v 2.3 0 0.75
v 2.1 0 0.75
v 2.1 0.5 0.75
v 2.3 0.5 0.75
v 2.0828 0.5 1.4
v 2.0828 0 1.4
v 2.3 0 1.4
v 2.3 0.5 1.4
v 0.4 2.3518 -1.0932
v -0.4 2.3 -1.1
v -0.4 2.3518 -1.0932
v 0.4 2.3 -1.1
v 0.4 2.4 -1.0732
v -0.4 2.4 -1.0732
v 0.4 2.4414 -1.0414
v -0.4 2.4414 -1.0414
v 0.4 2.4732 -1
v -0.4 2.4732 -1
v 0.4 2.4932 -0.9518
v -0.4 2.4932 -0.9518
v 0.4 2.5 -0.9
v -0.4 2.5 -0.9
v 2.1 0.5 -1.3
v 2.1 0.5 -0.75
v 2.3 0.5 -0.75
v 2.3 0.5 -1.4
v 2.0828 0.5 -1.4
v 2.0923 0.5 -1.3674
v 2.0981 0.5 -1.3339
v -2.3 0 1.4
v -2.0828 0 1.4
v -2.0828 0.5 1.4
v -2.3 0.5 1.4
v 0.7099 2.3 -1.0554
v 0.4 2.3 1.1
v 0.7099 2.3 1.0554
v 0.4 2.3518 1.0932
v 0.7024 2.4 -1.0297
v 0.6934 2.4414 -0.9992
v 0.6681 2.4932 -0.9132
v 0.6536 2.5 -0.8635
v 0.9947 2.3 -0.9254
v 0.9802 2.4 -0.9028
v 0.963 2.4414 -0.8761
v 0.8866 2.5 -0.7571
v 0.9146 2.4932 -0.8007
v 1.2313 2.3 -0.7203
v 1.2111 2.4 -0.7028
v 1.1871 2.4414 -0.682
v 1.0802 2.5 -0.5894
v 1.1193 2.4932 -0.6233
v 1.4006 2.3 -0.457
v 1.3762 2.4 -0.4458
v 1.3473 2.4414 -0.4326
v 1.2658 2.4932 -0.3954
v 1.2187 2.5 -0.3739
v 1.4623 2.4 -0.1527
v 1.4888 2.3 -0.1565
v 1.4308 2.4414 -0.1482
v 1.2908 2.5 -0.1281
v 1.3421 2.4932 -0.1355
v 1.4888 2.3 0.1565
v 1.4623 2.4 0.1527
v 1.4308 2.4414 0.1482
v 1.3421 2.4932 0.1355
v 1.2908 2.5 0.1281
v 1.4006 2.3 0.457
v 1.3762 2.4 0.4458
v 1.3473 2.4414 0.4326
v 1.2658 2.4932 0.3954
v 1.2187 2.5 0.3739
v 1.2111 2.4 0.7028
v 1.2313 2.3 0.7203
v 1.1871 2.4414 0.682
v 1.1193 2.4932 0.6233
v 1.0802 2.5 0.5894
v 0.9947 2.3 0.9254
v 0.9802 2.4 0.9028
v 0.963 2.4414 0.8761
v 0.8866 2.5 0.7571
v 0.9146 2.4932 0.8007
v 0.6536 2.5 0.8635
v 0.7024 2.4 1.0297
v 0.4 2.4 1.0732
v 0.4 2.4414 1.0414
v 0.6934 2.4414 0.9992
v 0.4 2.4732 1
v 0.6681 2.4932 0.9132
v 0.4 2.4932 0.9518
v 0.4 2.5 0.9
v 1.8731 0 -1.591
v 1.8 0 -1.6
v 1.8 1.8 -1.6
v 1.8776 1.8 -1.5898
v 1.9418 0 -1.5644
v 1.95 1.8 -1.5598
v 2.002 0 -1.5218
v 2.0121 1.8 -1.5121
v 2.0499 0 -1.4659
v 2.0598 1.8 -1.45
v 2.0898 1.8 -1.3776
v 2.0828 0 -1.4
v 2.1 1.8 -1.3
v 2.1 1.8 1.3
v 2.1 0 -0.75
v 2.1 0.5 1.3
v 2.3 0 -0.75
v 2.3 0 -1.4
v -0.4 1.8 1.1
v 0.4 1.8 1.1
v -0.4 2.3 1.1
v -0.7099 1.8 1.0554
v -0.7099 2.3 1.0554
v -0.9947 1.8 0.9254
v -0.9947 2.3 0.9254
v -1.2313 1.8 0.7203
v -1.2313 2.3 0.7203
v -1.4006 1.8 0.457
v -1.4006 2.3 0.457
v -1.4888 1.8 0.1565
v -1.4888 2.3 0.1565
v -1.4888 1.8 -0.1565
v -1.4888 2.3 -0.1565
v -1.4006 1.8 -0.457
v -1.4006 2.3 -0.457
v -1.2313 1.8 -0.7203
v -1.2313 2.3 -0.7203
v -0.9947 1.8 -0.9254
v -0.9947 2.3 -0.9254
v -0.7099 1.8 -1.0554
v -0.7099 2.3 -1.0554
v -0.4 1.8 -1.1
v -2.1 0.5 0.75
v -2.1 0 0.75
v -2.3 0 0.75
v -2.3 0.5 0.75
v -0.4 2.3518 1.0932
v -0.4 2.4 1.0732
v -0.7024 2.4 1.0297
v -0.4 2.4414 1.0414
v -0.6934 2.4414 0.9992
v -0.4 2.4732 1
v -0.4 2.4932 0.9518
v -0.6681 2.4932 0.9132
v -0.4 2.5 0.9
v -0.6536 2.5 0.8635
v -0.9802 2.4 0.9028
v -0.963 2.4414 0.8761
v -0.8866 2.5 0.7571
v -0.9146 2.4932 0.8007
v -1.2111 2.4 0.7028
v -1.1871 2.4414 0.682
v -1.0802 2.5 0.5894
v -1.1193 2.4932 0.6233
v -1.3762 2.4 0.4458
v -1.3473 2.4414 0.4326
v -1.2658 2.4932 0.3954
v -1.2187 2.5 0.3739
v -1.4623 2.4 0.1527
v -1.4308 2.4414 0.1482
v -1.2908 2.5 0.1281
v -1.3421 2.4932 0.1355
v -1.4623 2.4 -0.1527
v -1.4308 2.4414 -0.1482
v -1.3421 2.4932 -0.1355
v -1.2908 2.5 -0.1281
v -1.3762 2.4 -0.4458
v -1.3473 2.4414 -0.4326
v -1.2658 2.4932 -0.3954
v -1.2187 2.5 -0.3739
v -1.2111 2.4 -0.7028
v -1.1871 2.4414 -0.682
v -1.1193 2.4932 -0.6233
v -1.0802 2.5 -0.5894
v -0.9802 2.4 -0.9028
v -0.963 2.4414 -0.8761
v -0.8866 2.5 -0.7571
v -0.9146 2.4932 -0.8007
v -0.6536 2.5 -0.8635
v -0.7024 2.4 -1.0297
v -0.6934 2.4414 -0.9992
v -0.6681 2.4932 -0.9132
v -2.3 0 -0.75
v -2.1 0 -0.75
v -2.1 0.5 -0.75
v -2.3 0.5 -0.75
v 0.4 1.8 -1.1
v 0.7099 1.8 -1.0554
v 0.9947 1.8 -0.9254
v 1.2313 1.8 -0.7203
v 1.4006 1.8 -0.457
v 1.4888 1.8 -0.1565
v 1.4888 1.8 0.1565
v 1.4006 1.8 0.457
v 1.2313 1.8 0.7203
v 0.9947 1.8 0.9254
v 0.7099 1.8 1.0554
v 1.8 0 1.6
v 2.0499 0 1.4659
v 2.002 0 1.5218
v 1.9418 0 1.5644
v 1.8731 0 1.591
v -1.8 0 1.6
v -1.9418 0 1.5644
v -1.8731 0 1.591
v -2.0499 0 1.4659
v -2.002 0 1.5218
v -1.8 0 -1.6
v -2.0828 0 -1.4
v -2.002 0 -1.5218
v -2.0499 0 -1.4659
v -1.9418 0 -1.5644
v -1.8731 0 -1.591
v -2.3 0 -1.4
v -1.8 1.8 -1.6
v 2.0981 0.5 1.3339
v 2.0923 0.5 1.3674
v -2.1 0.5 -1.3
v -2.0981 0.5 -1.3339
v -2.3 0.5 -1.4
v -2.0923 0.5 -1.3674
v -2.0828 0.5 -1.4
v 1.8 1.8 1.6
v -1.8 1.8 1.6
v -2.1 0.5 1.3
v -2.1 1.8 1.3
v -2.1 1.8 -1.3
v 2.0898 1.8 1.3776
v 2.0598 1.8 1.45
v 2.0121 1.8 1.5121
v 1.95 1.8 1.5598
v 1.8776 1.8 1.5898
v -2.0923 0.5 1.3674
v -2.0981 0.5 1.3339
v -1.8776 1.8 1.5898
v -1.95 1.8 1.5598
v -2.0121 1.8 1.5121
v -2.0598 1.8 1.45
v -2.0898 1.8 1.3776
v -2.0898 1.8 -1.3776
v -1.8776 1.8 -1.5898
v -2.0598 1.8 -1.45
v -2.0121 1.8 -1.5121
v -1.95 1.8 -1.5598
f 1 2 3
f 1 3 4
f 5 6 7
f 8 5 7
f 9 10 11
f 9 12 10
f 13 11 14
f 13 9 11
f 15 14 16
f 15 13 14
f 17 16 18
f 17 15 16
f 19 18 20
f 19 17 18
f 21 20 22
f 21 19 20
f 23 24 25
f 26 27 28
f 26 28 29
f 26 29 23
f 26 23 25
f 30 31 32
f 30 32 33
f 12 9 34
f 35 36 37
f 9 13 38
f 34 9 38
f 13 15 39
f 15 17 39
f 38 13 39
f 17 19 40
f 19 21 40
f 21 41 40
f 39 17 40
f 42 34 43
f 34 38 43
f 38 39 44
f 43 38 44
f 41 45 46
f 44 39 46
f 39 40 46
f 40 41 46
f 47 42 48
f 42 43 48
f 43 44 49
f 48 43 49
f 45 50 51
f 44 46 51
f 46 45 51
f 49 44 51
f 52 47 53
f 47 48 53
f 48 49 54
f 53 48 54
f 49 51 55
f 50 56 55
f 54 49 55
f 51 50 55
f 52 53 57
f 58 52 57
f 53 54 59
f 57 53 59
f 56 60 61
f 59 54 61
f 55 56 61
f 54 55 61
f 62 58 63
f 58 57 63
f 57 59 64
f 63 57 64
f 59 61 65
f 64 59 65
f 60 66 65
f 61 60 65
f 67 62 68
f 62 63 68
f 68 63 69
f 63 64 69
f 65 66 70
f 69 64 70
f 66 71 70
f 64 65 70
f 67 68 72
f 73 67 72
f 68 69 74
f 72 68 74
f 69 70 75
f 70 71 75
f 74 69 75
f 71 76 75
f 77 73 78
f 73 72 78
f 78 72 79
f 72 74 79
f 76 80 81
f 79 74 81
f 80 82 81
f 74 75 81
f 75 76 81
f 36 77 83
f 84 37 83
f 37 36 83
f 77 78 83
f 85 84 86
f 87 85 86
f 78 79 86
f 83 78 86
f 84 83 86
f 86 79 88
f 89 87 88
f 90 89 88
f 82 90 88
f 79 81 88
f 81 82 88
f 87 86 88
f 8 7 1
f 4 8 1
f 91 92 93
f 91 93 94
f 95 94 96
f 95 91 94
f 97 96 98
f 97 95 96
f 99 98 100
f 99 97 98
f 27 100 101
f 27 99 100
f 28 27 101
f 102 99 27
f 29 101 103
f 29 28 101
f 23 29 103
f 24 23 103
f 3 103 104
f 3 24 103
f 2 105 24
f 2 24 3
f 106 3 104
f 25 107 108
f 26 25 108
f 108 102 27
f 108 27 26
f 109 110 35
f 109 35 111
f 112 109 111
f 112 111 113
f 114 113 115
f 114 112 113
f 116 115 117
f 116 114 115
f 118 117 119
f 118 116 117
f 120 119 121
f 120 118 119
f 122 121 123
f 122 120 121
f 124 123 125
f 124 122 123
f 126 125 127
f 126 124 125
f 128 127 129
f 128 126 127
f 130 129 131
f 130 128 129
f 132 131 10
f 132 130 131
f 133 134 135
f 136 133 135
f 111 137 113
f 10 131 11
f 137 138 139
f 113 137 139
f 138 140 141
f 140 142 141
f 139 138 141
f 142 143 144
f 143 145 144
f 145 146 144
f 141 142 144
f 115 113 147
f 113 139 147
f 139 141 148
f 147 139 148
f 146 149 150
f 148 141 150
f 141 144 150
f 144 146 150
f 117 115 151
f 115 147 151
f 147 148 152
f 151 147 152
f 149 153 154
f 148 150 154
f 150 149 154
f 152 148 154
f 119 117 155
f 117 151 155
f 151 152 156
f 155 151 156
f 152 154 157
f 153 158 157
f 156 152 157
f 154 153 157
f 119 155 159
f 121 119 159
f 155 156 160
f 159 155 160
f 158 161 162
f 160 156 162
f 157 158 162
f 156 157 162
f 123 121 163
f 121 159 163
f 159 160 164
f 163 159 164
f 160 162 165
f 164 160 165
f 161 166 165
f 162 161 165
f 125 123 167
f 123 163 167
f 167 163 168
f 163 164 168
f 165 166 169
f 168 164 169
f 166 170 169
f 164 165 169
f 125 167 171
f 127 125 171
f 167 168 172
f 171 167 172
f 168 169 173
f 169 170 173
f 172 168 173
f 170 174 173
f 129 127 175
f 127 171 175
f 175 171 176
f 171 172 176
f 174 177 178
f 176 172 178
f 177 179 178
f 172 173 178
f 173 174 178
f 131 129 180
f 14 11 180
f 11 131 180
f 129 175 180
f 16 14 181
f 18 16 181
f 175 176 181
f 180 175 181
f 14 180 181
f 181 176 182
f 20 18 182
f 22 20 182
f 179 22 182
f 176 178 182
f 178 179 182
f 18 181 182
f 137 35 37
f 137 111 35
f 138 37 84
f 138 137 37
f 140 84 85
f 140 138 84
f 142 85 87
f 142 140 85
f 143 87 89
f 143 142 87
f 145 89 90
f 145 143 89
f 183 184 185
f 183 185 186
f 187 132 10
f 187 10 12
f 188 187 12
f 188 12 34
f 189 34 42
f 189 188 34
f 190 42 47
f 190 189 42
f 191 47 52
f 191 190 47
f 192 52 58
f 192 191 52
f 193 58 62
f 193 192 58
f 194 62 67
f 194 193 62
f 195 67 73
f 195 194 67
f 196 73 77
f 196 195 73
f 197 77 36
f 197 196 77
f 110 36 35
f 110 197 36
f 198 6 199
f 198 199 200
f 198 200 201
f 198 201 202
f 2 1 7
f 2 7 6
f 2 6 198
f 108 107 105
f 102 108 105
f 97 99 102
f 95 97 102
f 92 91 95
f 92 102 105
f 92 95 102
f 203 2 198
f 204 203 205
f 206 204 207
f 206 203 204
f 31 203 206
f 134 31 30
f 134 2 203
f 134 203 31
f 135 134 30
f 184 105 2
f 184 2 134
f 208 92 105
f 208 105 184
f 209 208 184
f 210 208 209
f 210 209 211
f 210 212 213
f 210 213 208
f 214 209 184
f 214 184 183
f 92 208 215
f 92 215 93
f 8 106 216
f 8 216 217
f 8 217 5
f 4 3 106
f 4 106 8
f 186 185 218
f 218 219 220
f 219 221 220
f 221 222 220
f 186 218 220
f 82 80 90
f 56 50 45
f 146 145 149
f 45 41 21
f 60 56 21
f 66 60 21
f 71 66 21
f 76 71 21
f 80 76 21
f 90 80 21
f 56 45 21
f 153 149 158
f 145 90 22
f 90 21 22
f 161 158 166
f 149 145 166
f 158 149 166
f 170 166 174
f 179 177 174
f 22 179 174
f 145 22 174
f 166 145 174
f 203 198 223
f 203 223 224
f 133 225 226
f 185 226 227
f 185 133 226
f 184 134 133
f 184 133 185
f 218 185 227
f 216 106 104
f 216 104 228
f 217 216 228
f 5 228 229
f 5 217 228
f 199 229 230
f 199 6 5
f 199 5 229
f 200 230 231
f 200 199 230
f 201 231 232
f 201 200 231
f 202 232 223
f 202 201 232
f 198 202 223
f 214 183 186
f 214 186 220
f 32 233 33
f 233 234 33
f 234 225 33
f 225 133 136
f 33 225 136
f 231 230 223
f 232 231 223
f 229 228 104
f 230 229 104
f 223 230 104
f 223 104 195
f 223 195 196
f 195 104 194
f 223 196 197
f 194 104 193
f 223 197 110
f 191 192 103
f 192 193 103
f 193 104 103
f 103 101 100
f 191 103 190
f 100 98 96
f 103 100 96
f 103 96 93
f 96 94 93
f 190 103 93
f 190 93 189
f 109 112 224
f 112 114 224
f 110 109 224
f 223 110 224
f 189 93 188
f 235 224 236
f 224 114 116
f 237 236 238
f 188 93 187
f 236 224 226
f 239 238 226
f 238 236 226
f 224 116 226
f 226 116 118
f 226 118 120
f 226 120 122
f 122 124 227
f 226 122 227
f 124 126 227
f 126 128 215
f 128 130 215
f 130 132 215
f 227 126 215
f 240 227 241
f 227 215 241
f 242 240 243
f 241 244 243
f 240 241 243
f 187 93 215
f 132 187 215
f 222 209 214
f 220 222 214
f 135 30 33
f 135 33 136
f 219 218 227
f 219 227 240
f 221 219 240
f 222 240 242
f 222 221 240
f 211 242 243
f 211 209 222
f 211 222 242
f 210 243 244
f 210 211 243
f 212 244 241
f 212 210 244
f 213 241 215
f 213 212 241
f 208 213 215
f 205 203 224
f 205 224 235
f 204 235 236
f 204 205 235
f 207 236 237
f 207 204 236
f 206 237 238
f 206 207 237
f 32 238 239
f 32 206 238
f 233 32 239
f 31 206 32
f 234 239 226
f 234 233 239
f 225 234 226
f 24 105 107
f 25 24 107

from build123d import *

# Parameters (mm, degrees)
BOSS_EXTRUDE1_DEPTH = 1.8
BOSS_EXTRUDE2_DEPTH = 2.5
FILLET1_R           = 0.2
SKETCH3_W           = 0.75
SKETCH3_H           = 0.65
BOSS_EXTRUDE3_DEPTH = 0.5


with BuildPart() as part:
    # Sketch1 → Boss-Extrude1 (new body)
    with BuildSketch(Plane(origin=(0, 0, 0), x_dir=(1, 0, 0), z_dir=(0, 1, 0))):
        with BuildLine():
            Line((-1.8, 1.6), (1.8, 1.6))
            ThreePointArc((1.8, 1.6), (2.012132034, 1.512132034), (2.1, 1.3))
            Line((2.1, 1.3), (2.1, -1.3))
            ThreePointArc((2.1, -1.3), (2.012132034, -1.512132034), (1.8, -1.6))
            Line((1.8, -1.6), (-1.8, -1.6))
            ThreePointArc((-1.8, -1.6), (-2.012132034, -1.512132034), (-2.1, -1.3))
            Line((-2.1, -1.3), (-2.1, 1.3))
            ThreePointArc((-2.1, 1.3), (-2.012132034, 1.512132034), (-1.8, 1.6))
        make_face()
    extrude(amount=BOSS_EXTRUDE1_DEPTH)

    # Sketch2 → Boss-Extrude2 (add)
    with BuildSketch(Plane(origin=(0, 0, 0), x_dir=(1, 0, 0), z_dir=(0, 1, 0))):
        with BuildLine():
            Line((-0.4, 1.1), (0.4, 1.1))
            ThreePointArc((0.4, 1.1), (1.5, 0), (0.4, -1.1))
            Line((0.4, -1.1), (-0.4, -1.1))
            ThreePointArc((-0.4, -1.1), (-1.5, 0), (-0.4, 1.1))
        make_face()
    extrude(amount=BOSS_EXTRUDE2_DEPTH)

    # Fillet1
    fillet1_edges = [part.edges().sort_by_distance(p)[0] for p in [
        (-1.5, 2.5, 0),
        (0, 2.5, 1.1),
        (1.5, 2.5, 0),
        (0, 2.5, -1.1),
    ]]
    fillet(fillet1_edges, radius=FILLET1_R)

    # Sketch3 → Boss-Extrude3 (add)
    with BuildSketch(Plane(origin=(0, 0, 0), x_dir=(1, 0, 0), z_dir=(0, 1, 0))):
        with Locations((1.925, 1.075)):
            Rectangle(SKETCH3_W, SKETCH3_H)
        with Locations((1.925, -1.075)):
            Rectangle(SKETCH3_W, SKETCH3_H)
    boss_extrude3 = extrude(amount=BOSS_EXTRUDE3_DEPTH)

    # Mirror1: Boss-Extrude3 across plane
    add(boss_extrude3.mirror(Plane(origin=(0, 0, 0), x_dir=(0, 0, 1), z_dir=(1, 0, 0))))


solid = part.part
